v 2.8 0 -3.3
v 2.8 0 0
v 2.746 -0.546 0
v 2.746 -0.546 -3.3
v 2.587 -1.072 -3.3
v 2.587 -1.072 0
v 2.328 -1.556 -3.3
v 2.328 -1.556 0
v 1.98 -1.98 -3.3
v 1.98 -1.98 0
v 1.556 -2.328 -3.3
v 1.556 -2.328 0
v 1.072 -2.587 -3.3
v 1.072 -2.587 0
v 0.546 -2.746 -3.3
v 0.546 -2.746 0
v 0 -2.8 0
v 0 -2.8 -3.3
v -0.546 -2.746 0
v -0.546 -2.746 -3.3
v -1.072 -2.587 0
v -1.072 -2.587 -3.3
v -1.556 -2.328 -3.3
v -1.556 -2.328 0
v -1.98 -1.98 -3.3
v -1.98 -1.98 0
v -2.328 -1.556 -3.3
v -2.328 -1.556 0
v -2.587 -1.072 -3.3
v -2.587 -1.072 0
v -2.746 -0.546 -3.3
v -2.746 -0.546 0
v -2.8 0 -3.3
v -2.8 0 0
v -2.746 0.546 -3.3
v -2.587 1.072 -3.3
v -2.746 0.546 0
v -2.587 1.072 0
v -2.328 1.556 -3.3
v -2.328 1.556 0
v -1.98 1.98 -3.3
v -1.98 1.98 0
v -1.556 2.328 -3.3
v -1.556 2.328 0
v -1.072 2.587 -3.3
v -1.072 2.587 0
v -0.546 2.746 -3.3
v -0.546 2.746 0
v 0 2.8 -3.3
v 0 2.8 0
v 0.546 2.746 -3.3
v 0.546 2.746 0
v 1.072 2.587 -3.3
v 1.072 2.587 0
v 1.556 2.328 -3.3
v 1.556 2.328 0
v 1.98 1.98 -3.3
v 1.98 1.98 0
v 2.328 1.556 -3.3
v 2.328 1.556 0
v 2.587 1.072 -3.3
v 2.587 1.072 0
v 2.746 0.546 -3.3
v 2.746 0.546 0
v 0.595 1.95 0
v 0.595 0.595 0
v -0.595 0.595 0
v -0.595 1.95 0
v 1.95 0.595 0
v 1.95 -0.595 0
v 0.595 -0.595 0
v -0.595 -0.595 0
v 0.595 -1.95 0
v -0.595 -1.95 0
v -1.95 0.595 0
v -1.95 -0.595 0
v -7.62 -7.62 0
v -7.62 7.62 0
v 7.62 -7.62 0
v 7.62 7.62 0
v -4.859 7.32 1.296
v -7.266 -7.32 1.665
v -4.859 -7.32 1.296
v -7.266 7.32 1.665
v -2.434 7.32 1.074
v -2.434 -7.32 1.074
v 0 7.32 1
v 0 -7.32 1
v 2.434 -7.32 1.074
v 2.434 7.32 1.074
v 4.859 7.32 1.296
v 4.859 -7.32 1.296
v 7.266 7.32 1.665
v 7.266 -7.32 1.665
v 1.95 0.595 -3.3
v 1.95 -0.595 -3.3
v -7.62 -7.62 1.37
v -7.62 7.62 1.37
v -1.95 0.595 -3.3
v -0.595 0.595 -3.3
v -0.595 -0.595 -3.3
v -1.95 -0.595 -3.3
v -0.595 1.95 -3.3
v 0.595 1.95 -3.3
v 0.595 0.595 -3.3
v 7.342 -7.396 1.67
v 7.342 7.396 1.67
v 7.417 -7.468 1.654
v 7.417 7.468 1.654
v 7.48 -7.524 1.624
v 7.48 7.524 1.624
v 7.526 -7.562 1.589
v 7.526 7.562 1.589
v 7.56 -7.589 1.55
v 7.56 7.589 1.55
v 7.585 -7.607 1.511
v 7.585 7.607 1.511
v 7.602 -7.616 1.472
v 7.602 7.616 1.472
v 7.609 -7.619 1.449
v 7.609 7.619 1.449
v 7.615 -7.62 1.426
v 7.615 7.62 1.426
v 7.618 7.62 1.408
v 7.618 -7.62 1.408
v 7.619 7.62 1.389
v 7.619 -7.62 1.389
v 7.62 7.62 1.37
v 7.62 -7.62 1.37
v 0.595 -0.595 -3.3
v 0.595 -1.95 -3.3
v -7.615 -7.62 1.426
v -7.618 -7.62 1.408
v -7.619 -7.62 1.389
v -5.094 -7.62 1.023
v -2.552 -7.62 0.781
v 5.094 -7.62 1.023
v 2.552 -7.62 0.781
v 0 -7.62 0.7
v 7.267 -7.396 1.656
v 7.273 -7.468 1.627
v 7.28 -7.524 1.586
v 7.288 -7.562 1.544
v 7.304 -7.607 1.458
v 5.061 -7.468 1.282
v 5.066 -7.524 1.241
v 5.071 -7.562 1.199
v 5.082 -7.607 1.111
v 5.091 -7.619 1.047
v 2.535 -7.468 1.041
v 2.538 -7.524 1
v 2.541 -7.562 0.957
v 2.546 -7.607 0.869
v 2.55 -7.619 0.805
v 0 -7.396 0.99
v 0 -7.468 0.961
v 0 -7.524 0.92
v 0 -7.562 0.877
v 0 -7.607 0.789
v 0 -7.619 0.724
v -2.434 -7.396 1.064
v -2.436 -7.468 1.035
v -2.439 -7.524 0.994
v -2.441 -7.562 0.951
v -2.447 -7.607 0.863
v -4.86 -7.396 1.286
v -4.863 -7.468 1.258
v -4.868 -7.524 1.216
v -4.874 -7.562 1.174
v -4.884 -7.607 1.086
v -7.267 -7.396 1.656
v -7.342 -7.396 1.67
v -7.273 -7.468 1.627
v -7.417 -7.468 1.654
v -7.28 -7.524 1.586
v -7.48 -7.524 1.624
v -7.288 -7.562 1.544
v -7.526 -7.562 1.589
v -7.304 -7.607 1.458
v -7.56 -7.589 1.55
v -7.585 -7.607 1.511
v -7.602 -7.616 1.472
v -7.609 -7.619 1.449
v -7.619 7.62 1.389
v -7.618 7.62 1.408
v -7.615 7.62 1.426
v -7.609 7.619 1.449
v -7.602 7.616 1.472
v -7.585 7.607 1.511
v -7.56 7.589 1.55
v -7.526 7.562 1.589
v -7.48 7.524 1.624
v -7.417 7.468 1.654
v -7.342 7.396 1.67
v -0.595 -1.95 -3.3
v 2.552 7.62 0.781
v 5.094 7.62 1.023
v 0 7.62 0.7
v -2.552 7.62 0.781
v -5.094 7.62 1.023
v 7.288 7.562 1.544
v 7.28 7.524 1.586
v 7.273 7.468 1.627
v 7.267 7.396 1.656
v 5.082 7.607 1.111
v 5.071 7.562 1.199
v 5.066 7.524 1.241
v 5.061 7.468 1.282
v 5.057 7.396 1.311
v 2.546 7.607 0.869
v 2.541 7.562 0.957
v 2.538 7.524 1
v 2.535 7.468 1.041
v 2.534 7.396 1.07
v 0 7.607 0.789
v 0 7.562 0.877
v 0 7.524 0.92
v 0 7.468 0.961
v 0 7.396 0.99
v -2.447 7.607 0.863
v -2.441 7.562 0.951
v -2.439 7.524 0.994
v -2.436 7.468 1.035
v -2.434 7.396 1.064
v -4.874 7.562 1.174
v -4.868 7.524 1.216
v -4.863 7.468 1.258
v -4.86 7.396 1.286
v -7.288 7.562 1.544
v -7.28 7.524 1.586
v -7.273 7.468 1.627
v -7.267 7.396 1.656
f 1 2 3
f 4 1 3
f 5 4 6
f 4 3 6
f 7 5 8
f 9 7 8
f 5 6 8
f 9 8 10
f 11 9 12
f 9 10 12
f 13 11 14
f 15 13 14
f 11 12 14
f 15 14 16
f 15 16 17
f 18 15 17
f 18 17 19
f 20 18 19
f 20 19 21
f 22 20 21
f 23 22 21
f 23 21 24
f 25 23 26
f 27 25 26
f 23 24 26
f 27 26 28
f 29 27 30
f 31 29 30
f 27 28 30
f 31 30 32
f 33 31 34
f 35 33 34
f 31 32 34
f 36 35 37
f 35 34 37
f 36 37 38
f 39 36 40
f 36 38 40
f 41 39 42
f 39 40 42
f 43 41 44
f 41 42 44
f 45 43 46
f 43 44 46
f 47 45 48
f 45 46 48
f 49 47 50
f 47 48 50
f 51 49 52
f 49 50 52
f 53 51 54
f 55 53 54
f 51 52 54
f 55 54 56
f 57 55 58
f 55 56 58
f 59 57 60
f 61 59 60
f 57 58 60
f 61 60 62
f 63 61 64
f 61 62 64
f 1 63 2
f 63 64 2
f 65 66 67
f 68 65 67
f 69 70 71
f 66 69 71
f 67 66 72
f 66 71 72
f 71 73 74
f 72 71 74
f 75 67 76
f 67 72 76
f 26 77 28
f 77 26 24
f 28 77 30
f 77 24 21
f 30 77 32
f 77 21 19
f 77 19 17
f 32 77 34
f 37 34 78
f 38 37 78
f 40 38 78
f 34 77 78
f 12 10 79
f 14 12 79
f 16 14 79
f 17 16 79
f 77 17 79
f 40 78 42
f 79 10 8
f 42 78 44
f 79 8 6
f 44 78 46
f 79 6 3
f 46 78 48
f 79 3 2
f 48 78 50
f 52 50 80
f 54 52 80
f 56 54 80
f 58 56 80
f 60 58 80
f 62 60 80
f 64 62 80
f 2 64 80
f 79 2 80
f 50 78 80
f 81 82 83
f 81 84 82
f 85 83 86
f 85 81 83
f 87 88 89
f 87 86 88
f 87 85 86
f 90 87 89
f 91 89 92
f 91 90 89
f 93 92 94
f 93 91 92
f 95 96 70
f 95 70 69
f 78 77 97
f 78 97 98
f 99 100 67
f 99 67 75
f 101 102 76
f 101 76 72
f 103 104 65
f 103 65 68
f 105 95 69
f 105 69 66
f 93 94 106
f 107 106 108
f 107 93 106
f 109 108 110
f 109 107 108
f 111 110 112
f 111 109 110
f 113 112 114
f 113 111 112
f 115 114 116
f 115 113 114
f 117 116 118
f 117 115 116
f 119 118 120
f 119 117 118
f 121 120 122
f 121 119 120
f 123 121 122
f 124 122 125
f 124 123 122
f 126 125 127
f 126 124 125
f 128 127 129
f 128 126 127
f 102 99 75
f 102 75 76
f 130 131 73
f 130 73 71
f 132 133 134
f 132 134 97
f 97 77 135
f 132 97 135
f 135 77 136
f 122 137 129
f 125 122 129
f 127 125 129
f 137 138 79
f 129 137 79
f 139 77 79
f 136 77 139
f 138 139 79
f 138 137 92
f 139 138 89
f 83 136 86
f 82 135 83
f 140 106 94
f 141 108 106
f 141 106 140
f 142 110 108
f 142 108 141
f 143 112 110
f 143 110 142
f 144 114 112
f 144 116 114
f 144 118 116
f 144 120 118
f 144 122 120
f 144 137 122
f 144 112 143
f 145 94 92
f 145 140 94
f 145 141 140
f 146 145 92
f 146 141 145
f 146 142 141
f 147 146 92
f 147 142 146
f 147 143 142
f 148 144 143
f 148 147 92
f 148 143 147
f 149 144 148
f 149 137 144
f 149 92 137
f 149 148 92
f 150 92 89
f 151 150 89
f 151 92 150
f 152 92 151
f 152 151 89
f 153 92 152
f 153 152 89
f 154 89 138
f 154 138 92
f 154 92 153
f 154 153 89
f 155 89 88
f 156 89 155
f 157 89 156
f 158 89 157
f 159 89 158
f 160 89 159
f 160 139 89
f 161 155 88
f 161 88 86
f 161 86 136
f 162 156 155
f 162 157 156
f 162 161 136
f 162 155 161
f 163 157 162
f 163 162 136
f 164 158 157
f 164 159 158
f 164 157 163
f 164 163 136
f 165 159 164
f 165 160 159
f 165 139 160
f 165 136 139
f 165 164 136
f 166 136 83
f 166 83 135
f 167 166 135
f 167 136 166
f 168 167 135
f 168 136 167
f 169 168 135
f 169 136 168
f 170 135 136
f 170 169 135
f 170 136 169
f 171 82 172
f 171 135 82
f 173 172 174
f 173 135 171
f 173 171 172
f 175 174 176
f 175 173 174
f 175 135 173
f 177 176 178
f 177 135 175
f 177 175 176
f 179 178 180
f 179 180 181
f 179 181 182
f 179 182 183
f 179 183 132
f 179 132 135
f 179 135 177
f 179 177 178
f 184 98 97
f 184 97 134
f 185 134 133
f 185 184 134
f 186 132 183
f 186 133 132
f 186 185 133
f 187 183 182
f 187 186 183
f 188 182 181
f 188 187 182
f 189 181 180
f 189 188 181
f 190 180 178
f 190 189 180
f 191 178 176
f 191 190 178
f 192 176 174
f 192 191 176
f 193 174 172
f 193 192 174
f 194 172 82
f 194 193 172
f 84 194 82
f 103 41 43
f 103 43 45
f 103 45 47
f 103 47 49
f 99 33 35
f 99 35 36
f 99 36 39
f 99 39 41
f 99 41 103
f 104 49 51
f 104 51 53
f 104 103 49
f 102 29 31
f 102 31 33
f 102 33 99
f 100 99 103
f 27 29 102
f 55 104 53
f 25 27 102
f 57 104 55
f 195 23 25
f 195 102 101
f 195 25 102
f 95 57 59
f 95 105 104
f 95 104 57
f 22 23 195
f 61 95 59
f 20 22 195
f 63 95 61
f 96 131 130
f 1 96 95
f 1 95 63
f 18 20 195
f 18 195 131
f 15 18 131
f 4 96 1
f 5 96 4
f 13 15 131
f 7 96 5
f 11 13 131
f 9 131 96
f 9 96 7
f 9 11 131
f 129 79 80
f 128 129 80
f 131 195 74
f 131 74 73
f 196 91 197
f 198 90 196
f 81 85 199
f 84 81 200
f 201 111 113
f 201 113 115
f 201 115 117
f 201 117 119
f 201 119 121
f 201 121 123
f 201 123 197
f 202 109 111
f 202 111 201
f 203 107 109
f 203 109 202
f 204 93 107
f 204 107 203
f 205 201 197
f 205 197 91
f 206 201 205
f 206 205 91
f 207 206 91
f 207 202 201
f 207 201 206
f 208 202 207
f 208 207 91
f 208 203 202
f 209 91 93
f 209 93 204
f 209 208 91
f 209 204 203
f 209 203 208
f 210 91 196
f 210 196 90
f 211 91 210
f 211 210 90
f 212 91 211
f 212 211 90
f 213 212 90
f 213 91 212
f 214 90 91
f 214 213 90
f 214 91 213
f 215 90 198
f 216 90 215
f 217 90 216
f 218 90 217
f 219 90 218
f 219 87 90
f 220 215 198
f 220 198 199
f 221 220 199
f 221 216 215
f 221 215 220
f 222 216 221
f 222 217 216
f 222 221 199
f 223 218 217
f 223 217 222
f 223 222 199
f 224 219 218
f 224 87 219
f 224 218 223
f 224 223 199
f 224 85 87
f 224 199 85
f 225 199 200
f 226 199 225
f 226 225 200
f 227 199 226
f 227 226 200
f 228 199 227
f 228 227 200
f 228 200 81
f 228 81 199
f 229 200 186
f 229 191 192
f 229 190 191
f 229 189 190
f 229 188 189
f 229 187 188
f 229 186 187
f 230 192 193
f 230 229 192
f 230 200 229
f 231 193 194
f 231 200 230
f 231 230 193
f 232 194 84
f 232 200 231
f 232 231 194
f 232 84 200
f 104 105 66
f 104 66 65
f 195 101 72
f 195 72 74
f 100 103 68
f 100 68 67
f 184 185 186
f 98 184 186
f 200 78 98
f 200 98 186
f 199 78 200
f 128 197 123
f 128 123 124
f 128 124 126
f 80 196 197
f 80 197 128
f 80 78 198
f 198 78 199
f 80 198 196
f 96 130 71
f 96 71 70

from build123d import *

# Parameters (mm, degrees)
SKETCH_W       = 15.24
SKETCH_H       = 15.24
PAD_DEPTH      = 2
CYLINDER_R     = 40
CYLINDER_DEPTH = 18
FILLET_R       = 0.3
SKETCH001_R    = 2.8
PAD001_DEPTH   = 3.3
POCKET_DEPTH   = 3.3


with BuildPart() as part:
    # Sketch → Pad (new body)
    with BuildSketch(Plane.XY):
        Rectangle(SKETCH_W, SKETCH_H)
    extrude(amount=PAD_DEPTH)

    # Cylinder → Cylinder (cut)
    with BuildSketch(Plane(origin=(0, 9, 41), x_dir=(1, 0, 0), z_dir=(0, -1, 0))):
        Circle(CYLINDER_R)
    extrude(amount=CYLINDER_DEPTH, mode=Mode.SUBTRACT)

    # Fillet
    fillet_edges = [part.edges().sort_by_distance(p)[0] for p in [
        (0, -7.62, 1),
        (-7.62, 0, 1.732512),
        (7.62, 0, 1.732512),
        (0, 7.62, 1),
    ]]
    fillet(fillet_edges, radius=FILLET_R)

    # Sketch001 (on Face4 of Fillet) → Pad001 (join)
    with BuildSketch(Plane(origin=(0, 9, 0), x_dir=(1, 0, 0), z_dir=(0, 0, -1))):
        with Locations((0, 9)):
            Circle(SKETCH001_R)
    extrude(amount=PAD001_DEPTH)

    # Sketch002 (on Face12 of Pad001) → Pocket (cut)
    with BuildSketch(Plane(origin=(0, 9, -3.3), x_dir=(1, 0, 0), z_dir=(0, 0, -1))):
        Polygon((-0.595, 10.95), (0.595, 10.95), (0.595, 9.595), (1.95, 9.595), (1.95, 8.405), (0.595, 8.405), (0.595, 7.05), (-0.595, 7.05), (-0.595, 8.405), (-1.95, 8.405), (-1.95, 9.595), (-0.595, 9.595), align=None)
    extrude(amount=-POCKET_DEPTH, mode=Mode.SUBTRACT)


solid = part.part
